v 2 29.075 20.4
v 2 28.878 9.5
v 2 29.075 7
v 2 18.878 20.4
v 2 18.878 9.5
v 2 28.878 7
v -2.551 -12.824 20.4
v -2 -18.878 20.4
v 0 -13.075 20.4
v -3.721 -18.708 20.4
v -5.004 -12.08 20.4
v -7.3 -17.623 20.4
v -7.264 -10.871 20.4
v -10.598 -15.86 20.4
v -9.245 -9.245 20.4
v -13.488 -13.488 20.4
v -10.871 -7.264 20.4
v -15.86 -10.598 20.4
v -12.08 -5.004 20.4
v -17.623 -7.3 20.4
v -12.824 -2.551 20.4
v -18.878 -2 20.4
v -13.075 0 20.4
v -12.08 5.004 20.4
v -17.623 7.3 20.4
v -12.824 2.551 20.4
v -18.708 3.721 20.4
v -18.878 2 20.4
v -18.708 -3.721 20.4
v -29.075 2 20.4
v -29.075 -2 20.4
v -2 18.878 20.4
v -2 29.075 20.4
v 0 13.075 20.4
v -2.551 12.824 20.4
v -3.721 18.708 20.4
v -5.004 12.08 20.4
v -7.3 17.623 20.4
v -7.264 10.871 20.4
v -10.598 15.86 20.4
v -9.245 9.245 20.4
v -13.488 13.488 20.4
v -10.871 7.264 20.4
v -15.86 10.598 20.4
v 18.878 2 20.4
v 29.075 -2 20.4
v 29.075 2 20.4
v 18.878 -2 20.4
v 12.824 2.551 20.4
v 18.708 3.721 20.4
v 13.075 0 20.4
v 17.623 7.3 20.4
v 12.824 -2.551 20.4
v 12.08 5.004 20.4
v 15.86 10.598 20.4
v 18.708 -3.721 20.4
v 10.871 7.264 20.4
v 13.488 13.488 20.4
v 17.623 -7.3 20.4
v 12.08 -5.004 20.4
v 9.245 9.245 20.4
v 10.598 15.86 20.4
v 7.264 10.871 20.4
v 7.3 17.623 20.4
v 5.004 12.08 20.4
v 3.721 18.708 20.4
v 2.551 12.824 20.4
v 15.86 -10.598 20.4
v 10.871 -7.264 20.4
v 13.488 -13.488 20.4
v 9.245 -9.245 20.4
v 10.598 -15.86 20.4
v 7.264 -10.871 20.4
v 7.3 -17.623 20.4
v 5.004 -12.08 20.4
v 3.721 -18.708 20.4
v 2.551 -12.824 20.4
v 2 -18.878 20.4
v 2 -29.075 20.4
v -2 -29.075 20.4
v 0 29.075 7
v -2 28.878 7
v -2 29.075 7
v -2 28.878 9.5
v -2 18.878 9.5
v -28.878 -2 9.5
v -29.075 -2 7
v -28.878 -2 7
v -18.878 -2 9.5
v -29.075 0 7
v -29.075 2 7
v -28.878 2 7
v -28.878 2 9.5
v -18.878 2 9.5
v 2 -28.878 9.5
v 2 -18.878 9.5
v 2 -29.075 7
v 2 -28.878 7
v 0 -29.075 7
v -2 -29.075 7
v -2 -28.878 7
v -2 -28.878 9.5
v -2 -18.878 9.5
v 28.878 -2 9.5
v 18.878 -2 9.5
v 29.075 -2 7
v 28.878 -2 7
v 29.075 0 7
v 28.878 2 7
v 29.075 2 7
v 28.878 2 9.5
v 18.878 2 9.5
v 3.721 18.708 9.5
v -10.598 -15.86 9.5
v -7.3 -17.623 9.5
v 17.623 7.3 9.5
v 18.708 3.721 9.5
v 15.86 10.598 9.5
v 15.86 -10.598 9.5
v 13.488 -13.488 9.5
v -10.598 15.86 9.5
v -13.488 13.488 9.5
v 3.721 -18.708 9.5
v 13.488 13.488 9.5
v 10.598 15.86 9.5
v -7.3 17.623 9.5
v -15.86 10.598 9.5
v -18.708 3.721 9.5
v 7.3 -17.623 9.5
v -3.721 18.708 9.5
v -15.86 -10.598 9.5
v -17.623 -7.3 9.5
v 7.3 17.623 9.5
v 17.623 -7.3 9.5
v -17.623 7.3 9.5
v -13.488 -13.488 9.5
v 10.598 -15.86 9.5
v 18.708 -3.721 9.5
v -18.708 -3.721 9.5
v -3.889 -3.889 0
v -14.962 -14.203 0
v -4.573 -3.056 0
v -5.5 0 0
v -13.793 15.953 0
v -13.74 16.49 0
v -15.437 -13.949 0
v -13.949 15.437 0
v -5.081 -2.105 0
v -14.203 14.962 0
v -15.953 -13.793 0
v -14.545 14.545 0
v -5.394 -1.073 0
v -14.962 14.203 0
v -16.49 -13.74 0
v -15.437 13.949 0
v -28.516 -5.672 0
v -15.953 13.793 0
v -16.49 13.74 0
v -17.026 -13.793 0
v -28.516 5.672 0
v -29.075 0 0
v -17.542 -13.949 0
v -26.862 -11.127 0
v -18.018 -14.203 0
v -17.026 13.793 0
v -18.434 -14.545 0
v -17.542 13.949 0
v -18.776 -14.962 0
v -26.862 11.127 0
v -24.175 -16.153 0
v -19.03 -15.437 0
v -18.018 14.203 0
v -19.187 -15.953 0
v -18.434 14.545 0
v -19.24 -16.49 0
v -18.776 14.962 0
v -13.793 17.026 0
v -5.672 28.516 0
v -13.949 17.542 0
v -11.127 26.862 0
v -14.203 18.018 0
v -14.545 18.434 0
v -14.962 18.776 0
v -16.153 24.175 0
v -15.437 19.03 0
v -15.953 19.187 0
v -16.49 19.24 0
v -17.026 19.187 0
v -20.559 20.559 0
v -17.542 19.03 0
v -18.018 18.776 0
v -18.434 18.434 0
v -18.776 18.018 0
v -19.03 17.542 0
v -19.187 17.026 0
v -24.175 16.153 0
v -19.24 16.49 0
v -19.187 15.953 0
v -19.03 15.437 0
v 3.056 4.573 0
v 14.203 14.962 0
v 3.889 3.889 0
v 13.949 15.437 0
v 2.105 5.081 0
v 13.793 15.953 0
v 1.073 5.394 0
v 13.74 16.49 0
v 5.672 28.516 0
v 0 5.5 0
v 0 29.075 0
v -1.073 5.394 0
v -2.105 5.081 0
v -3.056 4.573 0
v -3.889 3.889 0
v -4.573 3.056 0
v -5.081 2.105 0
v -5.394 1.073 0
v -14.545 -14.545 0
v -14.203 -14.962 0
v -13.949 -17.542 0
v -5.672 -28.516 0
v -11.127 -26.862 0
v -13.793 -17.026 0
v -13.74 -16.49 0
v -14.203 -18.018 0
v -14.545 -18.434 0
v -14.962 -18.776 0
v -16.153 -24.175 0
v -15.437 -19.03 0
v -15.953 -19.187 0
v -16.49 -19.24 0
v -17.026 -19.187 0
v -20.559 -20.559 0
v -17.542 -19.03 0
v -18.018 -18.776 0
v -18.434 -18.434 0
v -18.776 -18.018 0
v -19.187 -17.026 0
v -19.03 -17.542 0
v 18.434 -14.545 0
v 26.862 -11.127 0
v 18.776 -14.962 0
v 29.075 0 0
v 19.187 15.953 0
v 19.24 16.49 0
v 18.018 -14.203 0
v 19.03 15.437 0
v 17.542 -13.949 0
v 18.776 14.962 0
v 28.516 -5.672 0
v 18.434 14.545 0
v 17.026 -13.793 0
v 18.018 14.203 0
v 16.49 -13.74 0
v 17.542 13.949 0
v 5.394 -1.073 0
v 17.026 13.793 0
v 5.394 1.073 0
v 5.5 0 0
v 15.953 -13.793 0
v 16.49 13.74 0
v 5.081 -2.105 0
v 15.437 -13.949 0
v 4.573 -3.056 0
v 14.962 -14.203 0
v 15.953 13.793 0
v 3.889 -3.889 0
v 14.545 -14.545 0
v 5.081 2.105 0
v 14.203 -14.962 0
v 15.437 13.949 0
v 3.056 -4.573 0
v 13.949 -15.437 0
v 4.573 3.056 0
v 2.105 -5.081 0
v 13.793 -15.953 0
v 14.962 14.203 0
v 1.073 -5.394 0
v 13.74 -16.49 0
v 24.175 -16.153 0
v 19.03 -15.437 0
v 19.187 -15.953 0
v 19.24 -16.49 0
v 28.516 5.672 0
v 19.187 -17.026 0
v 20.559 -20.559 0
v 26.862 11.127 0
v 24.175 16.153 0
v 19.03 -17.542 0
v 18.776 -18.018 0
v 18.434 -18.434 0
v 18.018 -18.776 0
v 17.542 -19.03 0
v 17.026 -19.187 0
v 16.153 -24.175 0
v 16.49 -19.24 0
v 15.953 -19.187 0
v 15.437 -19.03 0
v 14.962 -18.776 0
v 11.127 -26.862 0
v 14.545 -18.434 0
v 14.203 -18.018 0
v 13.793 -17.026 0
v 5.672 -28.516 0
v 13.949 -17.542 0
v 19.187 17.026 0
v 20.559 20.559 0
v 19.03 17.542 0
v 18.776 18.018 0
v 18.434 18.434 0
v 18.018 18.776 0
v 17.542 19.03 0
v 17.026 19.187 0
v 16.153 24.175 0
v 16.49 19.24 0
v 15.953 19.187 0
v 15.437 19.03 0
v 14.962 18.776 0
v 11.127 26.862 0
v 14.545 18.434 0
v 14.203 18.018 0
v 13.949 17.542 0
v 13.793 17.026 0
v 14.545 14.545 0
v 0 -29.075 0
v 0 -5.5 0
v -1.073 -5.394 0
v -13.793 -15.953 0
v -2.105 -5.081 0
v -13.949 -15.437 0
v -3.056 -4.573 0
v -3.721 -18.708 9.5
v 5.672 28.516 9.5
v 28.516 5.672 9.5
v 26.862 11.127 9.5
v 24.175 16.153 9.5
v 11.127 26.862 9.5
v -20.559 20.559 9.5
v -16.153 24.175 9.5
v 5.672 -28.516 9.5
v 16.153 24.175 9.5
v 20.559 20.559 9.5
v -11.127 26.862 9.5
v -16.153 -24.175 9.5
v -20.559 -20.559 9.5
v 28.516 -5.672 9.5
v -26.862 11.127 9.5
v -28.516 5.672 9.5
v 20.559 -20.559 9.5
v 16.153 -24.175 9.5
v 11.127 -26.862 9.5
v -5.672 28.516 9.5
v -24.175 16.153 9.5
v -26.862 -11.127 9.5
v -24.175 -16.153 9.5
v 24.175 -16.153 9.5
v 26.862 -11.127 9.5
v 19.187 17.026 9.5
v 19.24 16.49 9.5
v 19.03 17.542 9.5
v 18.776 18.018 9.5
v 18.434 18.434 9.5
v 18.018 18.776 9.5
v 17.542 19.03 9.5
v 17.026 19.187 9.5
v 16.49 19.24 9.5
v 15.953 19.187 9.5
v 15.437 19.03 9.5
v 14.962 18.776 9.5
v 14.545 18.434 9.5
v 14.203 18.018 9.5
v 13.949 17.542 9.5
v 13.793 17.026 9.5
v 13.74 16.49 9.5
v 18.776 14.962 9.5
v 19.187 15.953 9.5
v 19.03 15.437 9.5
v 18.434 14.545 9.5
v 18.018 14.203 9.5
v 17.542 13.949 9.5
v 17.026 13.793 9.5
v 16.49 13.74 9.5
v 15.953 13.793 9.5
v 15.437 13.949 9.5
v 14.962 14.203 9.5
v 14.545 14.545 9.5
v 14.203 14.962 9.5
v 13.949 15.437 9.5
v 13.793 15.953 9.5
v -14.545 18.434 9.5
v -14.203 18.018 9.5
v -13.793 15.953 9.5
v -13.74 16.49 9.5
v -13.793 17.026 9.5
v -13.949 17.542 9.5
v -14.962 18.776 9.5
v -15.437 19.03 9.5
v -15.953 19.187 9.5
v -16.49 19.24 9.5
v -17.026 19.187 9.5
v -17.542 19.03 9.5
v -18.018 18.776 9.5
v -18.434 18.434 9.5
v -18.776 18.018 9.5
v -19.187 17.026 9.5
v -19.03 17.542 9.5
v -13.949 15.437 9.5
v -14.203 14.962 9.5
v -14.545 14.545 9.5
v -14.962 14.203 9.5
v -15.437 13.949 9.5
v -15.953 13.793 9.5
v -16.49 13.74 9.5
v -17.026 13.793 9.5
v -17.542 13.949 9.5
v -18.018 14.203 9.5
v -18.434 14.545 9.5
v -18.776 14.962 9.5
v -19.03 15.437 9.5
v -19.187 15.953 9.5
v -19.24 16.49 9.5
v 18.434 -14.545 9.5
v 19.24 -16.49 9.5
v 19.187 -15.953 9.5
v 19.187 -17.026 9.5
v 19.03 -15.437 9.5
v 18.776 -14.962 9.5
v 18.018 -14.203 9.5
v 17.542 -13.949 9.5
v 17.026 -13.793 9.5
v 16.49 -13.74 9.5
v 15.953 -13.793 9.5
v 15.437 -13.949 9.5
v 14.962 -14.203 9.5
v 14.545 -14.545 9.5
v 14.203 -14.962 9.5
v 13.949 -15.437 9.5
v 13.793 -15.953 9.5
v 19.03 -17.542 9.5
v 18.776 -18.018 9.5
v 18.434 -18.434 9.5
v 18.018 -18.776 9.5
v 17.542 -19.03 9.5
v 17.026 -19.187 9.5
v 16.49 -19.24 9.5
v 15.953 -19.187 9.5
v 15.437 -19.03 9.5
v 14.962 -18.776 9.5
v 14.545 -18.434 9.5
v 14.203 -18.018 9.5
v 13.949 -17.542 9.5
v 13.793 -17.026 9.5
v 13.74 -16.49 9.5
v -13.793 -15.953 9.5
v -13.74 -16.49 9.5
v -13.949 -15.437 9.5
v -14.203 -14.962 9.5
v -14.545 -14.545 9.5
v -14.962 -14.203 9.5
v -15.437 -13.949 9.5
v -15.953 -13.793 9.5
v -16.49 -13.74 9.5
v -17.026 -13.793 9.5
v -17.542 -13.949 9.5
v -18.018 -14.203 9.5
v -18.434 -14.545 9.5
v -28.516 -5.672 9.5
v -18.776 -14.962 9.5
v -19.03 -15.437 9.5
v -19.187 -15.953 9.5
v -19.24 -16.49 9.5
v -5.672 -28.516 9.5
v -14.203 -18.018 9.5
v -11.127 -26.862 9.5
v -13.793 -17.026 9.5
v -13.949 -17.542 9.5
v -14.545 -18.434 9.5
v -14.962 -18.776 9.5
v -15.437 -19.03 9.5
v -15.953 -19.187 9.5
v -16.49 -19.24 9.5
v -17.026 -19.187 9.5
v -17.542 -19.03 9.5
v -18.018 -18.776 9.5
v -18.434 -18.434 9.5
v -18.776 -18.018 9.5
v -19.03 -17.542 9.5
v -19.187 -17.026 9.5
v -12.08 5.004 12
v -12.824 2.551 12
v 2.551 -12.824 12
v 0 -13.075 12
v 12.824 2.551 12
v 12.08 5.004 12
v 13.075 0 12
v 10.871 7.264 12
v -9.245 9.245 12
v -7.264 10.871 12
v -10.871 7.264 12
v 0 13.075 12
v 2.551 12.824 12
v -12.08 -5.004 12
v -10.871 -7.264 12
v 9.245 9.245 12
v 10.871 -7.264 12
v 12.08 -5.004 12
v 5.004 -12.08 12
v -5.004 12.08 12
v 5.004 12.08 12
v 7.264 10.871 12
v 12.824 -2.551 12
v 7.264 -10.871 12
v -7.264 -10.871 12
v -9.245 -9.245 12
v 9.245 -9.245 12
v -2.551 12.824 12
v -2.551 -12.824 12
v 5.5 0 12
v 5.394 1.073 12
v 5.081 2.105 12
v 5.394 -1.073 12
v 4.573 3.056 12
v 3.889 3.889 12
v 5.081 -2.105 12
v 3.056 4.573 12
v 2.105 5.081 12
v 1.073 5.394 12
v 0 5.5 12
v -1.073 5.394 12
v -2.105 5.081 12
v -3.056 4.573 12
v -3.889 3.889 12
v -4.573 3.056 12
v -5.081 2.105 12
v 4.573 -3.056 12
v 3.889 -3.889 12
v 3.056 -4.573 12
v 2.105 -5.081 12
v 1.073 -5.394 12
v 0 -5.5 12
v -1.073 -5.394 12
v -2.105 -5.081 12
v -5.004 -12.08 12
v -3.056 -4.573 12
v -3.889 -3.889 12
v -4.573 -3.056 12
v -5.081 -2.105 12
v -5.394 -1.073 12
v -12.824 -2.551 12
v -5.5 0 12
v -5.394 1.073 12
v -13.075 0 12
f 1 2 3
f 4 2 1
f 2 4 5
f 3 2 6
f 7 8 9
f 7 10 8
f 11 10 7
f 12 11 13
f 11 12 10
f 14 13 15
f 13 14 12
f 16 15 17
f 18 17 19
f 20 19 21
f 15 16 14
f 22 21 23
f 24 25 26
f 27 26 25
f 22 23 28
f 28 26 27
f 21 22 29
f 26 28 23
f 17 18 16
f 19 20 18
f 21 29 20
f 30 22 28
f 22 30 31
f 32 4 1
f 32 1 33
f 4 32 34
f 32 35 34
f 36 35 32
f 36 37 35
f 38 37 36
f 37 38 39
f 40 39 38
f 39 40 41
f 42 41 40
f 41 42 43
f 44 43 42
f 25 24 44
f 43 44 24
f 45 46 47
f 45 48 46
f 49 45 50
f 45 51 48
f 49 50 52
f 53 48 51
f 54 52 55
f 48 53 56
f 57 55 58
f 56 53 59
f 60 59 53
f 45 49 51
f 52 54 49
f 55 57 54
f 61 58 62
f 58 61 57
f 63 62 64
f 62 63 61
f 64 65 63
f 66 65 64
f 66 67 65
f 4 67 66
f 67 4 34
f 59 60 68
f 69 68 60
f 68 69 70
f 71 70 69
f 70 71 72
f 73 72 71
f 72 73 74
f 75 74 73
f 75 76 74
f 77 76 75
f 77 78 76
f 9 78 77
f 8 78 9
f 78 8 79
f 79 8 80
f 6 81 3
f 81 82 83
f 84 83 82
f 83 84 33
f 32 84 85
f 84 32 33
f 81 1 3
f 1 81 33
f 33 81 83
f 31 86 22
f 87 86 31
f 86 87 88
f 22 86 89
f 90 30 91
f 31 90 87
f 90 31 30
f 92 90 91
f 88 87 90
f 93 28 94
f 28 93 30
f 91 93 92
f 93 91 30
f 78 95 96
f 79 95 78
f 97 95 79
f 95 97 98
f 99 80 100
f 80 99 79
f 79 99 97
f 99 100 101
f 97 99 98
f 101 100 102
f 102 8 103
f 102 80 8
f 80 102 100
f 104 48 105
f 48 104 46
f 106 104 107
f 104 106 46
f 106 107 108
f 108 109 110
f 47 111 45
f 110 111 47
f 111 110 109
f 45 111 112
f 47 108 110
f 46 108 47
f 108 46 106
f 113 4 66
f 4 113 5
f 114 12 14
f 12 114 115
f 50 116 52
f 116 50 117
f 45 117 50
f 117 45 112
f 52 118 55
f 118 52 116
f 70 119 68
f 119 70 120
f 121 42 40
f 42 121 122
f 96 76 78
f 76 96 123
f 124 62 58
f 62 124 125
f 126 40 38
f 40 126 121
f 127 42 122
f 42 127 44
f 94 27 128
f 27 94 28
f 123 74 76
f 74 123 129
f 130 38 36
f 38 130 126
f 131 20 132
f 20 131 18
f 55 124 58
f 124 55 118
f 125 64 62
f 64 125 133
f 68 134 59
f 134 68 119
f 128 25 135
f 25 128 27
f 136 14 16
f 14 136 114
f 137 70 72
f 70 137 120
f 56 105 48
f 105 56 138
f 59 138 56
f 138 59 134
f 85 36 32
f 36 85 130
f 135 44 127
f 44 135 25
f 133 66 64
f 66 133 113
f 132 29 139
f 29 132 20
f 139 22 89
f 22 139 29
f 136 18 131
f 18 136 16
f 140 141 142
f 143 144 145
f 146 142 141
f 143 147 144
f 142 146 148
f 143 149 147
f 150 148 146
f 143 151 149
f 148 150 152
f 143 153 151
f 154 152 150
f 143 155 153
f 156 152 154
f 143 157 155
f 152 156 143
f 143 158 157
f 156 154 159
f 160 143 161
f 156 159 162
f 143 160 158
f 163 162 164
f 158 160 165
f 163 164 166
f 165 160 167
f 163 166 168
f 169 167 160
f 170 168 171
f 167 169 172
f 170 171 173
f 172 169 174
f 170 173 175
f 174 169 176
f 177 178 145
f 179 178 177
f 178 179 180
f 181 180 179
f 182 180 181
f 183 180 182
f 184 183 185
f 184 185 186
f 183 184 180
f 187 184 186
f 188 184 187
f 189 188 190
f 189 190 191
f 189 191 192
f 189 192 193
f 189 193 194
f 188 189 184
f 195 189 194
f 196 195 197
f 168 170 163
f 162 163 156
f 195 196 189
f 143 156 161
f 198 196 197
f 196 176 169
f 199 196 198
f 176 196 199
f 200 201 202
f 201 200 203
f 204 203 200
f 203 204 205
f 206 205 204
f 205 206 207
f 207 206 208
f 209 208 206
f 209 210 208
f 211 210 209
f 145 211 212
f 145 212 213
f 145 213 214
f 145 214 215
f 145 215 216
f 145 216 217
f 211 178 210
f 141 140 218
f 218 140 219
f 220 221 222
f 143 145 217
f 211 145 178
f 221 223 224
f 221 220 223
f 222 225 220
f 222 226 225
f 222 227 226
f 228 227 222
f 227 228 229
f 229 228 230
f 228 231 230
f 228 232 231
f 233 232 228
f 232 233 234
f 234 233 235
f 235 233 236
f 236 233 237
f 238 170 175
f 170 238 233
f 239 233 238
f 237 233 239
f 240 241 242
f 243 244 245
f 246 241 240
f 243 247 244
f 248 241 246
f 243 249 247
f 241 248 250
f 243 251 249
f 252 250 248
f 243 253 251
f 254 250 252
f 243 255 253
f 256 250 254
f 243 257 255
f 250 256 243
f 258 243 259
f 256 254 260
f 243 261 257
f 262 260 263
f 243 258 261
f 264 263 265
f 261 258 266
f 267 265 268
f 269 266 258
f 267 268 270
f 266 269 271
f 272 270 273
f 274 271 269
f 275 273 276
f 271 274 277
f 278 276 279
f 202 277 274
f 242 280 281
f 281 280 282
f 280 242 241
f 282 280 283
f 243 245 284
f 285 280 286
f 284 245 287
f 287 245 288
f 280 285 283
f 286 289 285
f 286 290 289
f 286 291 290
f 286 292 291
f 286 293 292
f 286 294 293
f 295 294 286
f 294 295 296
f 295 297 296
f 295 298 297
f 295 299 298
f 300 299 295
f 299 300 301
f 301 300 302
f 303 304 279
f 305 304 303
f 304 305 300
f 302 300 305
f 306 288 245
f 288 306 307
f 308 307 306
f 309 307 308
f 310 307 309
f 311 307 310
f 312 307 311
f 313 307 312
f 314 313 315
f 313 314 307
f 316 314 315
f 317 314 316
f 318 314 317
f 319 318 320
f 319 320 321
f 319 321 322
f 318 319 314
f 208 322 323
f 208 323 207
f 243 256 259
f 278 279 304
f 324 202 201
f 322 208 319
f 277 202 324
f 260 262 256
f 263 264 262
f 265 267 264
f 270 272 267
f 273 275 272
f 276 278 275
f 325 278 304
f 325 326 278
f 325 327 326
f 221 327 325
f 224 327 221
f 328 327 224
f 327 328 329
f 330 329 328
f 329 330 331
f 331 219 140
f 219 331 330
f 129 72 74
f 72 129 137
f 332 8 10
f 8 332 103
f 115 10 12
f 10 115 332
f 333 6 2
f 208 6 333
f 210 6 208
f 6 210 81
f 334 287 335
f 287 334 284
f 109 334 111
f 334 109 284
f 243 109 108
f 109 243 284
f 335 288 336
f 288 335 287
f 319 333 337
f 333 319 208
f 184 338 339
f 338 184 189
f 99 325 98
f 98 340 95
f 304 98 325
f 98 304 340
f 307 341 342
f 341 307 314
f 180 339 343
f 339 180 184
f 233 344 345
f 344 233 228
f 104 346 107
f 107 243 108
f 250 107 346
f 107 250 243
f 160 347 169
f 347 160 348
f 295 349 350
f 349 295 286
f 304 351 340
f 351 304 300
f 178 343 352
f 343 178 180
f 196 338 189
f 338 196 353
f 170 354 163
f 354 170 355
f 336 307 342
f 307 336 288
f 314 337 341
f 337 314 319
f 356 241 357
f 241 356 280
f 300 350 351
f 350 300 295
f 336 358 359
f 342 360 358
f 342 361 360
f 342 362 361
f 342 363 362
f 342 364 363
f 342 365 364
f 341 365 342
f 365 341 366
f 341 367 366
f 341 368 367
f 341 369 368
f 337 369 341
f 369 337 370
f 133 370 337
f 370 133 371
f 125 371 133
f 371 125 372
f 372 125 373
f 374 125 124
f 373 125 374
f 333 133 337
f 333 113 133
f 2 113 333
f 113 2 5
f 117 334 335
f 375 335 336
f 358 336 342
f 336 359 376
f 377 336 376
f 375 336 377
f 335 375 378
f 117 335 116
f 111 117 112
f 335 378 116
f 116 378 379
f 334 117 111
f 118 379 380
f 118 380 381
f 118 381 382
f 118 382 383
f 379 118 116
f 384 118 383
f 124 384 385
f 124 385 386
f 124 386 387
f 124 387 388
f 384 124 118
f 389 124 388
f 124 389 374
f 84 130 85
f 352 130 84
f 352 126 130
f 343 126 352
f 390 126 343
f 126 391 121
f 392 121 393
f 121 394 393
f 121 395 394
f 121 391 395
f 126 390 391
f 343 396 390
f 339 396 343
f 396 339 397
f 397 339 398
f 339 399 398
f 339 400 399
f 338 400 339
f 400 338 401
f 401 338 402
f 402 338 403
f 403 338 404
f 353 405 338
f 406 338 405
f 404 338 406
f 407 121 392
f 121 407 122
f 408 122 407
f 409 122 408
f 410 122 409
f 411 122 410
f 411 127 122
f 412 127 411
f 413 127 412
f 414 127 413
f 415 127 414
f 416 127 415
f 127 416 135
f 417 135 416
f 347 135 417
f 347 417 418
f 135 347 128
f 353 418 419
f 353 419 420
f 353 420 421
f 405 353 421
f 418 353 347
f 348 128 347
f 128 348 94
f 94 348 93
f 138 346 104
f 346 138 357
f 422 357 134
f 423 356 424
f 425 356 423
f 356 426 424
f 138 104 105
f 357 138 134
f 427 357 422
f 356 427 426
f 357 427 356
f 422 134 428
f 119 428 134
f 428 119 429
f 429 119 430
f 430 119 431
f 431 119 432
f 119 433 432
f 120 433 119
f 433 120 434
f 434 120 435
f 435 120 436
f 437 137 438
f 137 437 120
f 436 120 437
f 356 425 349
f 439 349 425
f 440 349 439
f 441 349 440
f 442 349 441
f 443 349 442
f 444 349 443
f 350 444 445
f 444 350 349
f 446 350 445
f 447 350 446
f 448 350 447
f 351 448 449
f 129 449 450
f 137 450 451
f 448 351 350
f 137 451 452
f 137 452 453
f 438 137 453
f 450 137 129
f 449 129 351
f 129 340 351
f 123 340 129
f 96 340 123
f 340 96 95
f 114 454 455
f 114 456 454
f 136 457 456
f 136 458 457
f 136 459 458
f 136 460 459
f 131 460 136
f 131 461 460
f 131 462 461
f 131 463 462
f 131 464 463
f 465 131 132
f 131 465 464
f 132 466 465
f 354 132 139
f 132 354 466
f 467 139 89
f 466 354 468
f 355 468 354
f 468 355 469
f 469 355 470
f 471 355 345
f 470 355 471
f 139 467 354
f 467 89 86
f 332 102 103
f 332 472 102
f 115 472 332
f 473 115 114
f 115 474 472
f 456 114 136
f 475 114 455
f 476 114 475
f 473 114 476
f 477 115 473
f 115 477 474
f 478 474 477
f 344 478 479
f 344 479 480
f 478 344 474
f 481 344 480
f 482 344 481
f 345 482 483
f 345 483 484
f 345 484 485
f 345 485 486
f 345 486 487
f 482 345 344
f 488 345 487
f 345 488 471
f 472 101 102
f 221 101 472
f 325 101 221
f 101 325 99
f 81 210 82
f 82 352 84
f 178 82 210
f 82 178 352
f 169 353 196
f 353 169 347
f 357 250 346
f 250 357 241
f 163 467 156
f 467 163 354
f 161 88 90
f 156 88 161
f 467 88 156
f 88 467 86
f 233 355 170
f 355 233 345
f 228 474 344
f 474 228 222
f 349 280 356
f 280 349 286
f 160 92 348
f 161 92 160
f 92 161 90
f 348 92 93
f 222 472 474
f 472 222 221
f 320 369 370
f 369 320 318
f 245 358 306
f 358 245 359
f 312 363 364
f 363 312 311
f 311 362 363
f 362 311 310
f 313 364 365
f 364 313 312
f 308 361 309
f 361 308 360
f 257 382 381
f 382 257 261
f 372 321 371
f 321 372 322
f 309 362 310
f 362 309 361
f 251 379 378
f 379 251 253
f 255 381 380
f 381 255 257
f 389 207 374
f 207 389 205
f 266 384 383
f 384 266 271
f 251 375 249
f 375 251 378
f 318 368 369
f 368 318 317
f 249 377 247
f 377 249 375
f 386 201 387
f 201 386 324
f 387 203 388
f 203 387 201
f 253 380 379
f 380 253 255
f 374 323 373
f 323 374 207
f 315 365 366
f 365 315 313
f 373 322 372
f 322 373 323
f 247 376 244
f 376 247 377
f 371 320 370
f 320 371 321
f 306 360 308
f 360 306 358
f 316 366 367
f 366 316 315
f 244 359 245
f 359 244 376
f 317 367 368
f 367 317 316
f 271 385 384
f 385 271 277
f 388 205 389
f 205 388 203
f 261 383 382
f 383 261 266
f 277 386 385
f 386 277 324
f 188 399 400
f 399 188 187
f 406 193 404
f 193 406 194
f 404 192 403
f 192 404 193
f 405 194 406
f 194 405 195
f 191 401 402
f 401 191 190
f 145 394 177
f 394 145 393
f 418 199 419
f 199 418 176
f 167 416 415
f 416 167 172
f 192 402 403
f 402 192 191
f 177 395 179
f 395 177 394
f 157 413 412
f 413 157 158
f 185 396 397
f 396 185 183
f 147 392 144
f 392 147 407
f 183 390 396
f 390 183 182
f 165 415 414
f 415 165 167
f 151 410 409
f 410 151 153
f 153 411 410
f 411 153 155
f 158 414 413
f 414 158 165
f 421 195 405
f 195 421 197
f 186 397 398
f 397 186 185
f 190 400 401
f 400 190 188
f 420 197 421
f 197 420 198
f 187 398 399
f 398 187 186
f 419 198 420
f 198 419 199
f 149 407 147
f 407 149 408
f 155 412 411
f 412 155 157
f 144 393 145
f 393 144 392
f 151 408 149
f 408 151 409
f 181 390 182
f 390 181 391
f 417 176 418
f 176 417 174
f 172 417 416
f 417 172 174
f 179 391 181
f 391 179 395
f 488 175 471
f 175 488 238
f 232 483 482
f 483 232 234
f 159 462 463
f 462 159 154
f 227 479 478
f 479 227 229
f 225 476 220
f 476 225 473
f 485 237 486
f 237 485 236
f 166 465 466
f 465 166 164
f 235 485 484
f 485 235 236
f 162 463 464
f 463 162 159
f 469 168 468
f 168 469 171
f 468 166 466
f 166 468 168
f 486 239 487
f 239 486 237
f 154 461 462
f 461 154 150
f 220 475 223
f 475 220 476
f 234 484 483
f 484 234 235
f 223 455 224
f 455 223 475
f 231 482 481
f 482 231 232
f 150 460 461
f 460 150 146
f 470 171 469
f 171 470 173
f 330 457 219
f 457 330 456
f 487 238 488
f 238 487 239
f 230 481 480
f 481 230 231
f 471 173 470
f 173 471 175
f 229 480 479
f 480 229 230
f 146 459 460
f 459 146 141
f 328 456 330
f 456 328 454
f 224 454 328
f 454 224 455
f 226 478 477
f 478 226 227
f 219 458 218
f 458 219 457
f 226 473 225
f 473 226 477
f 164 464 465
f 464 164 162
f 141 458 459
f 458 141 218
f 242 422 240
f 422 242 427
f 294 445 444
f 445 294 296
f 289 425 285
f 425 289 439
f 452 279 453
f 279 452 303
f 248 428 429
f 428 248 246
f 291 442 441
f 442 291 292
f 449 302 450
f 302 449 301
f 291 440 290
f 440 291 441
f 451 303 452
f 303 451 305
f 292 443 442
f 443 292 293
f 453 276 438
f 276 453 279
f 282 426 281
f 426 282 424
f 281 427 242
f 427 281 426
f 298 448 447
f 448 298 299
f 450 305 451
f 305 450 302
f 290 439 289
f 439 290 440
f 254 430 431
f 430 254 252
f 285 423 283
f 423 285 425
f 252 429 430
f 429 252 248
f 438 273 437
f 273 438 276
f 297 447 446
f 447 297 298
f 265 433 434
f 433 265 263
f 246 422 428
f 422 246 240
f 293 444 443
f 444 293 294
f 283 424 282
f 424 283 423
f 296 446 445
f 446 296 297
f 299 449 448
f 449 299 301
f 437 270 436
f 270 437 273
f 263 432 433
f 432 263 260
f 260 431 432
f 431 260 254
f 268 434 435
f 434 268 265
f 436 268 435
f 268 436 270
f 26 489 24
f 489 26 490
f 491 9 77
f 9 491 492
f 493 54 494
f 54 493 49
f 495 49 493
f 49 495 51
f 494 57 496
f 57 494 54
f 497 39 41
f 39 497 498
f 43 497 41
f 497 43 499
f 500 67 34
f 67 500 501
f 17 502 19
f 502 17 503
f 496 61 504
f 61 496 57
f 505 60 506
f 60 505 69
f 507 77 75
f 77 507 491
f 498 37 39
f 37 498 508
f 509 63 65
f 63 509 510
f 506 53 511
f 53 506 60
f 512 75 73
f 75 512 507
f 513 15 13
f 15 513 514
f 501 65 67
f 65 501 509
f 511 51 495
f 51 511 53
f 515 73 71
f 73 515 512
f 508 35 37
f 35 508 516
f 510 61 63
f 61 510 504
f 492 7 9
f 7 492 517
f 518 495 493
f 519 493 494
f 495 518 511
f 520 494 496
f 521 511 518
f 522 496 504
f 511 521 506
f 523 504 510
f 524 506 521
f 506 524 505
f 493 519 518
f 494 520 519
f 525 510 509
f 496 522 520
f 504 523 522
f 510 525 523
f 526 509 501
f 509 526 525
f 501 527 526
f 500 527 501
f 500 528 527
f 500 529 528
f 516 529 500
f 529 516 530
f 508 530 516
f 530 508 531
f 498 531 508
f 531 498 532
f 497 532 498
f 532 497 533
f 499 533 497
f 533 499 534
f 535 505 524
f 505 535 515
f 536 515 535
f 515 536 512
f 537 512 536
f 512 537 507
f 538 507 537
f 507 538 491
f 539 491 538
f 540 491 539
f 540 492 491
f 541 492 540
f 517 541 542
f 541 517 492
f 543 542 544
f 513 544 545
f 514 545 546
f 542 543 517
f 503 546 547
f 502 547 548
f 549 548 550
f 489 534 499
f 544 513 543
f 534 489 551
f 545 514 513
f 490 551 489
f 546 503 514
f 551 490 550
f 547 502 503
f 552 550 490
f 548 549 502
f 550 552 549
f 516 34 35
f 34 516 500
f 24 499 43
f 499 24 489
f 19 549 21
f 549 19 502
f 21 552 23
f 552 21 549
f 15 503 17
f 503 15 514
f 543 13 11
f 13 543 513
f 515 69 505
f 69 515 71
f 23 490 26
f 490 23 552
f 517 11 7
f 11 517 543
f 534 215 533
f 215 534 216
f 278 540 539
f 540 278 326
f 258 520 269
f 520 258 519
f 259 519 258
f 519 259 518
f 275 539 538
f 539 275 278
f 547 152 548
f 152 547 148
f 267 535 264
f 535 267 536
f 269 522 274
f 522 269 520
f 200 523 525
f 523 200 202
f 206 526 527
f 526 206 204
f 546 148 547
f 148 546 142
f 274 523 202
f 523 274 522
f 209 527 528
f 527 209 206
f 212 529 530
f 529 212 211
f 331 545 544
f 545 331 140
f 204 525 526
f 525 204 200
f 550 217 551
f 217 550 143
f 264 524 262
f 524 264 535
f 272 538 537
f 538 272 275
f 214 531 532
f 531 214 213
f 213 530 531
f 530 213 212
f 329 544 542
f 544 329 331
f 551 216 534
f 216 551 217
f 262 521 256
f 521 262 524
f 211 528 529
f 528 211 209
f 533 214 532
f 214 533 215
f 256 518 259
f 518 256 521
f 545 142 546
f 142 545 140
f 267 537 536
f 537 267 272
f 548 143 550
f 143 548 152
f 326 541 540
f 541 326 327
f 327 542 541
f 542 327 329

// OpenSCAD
$fn = 32;

// ----------------------------------------------------------------------
// Bearing housing: seat for 6000 (26 x 8 mm), 38.15 mm body
// ----------------------------------------------------------------------

// --- parameters (mm) ---
case_d = 38.15;           // housing outside diameter
case_h = 20.4;            // overall housing height
rim_t = 6;                // wall thickness
bearing_seat = 26.15;     // 6000 seat, 0.15 mm clearance
seat_h = 8.4;             // pocket depth
shoulder = 4;             // shoulder under the bearing
pass_d = 11;              // shaft passage
ear_d = 58.15;            // mounting flange diameter
flange_t = 8;             // flange thickness
bolt_d = 5.5;             // flange bolt clearance
bolt_r = 23.32;           // flange bolt circle radius
rib_w = 4;                // rib width
rib_n = 4;                // rib count

module body() {
  cylinder(h = case_h, d = case_d);
}

module flange() {
  /* flange sunk 1.5 mm into the body */
  cylinder(h = flange_t + 1.5, d = ear_d);
}

module ribs() {
  for (i = [0 : rib_n - 1])
    rotate([0, 0, i * 360 / rib_n])
      translate([-rib_w / 2, case_d / 2 - 0.8, flange_t - 1])
        cube([rib_w, (ear_d - case_d) / 2 + 0.8, case_h - flange_t + 1]);
}

difference() {
  union() {
    body();
    flange();
    ribs();
  }
  translate([0, 0, case_h - seat_h]) cylinder(h = seat_h + 1, d = bearing_seat);
  translate([0, 0, -1]) cylinder(h = case_h - seat_h + 1, d = pass_d);
  for (i = [0 : 3]) rotate([0, 0, 45 + i * 90]) translate([bolt_r, 0, -1])
    cylinder(h = flange_t + 3, d = bolt_d);
}
